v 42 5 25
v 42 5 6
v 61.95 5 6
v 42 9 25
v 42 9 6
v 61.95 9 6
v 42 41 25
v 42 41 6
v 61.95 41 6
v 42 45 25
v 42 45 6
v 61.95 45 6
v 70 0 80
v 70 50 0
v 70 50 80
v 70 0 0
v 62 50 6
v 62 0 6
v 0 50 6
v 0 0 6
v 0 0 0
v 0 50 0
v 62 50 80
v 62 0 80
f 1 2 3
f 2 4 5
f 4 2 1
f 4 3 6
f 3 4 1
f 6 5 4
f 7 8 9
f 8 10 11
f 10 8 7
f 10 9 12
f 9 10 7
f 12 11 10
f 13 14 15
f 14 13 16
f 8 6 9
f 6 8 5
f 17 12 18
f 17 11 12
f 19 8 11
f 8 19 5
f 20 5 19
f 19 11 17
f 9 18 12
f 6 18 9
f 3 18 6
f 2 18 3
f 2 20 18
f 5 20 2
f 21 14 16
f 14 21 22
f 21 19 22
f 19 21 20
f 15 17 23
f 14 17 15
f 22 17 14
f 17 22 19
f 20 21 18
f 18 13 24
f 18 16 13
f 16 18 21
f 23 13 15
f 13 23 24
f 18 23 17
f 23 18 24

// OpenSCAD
$fn = 32;

// ----------------------------------------------------------------------
// Rib bracket: 2-gusset L bracket
// ----------------------------------------------------------------------

// --- parameters (mm) ---
base_l = 70;              // foot length, X
base_w = 50;              // foot width, Y
base_t = 6;               // foot thickness
plate_t = 8;              // upright plate thickness
plate_h = 80;             // overall height
gus_l = 20;               // gusset leg along the foot
gus_h = 20;               // gusset height
gus_t = 4;                // gusset thickness
gus_edge = 5;             // gusset margin from the foot edge
n_gus = 2;                // gusset count

gus_pitch = (base_w - 2 * gus_edge - gus_t) / (n_gus - 1);  // gusset pitch

union() {
  cube([base_l, base_w, base_t]);
  translate([base_l - plate_t, 0, base_t - 1])
    cube([plate_t, base_w, plate_h - base_t + 1]);
  for (i = [0 : n_gus - 1])
    translate([base_l - plate_t - gus_l, gus_edge + i * gus_pitch, base_t - 1])
      rotate([-90, 0, 0])
        linear_extrude(height = gus_t)
          polygon(points = [[0, 0], [gus_l + 1, 0], [0, -gus_h]]);
}
